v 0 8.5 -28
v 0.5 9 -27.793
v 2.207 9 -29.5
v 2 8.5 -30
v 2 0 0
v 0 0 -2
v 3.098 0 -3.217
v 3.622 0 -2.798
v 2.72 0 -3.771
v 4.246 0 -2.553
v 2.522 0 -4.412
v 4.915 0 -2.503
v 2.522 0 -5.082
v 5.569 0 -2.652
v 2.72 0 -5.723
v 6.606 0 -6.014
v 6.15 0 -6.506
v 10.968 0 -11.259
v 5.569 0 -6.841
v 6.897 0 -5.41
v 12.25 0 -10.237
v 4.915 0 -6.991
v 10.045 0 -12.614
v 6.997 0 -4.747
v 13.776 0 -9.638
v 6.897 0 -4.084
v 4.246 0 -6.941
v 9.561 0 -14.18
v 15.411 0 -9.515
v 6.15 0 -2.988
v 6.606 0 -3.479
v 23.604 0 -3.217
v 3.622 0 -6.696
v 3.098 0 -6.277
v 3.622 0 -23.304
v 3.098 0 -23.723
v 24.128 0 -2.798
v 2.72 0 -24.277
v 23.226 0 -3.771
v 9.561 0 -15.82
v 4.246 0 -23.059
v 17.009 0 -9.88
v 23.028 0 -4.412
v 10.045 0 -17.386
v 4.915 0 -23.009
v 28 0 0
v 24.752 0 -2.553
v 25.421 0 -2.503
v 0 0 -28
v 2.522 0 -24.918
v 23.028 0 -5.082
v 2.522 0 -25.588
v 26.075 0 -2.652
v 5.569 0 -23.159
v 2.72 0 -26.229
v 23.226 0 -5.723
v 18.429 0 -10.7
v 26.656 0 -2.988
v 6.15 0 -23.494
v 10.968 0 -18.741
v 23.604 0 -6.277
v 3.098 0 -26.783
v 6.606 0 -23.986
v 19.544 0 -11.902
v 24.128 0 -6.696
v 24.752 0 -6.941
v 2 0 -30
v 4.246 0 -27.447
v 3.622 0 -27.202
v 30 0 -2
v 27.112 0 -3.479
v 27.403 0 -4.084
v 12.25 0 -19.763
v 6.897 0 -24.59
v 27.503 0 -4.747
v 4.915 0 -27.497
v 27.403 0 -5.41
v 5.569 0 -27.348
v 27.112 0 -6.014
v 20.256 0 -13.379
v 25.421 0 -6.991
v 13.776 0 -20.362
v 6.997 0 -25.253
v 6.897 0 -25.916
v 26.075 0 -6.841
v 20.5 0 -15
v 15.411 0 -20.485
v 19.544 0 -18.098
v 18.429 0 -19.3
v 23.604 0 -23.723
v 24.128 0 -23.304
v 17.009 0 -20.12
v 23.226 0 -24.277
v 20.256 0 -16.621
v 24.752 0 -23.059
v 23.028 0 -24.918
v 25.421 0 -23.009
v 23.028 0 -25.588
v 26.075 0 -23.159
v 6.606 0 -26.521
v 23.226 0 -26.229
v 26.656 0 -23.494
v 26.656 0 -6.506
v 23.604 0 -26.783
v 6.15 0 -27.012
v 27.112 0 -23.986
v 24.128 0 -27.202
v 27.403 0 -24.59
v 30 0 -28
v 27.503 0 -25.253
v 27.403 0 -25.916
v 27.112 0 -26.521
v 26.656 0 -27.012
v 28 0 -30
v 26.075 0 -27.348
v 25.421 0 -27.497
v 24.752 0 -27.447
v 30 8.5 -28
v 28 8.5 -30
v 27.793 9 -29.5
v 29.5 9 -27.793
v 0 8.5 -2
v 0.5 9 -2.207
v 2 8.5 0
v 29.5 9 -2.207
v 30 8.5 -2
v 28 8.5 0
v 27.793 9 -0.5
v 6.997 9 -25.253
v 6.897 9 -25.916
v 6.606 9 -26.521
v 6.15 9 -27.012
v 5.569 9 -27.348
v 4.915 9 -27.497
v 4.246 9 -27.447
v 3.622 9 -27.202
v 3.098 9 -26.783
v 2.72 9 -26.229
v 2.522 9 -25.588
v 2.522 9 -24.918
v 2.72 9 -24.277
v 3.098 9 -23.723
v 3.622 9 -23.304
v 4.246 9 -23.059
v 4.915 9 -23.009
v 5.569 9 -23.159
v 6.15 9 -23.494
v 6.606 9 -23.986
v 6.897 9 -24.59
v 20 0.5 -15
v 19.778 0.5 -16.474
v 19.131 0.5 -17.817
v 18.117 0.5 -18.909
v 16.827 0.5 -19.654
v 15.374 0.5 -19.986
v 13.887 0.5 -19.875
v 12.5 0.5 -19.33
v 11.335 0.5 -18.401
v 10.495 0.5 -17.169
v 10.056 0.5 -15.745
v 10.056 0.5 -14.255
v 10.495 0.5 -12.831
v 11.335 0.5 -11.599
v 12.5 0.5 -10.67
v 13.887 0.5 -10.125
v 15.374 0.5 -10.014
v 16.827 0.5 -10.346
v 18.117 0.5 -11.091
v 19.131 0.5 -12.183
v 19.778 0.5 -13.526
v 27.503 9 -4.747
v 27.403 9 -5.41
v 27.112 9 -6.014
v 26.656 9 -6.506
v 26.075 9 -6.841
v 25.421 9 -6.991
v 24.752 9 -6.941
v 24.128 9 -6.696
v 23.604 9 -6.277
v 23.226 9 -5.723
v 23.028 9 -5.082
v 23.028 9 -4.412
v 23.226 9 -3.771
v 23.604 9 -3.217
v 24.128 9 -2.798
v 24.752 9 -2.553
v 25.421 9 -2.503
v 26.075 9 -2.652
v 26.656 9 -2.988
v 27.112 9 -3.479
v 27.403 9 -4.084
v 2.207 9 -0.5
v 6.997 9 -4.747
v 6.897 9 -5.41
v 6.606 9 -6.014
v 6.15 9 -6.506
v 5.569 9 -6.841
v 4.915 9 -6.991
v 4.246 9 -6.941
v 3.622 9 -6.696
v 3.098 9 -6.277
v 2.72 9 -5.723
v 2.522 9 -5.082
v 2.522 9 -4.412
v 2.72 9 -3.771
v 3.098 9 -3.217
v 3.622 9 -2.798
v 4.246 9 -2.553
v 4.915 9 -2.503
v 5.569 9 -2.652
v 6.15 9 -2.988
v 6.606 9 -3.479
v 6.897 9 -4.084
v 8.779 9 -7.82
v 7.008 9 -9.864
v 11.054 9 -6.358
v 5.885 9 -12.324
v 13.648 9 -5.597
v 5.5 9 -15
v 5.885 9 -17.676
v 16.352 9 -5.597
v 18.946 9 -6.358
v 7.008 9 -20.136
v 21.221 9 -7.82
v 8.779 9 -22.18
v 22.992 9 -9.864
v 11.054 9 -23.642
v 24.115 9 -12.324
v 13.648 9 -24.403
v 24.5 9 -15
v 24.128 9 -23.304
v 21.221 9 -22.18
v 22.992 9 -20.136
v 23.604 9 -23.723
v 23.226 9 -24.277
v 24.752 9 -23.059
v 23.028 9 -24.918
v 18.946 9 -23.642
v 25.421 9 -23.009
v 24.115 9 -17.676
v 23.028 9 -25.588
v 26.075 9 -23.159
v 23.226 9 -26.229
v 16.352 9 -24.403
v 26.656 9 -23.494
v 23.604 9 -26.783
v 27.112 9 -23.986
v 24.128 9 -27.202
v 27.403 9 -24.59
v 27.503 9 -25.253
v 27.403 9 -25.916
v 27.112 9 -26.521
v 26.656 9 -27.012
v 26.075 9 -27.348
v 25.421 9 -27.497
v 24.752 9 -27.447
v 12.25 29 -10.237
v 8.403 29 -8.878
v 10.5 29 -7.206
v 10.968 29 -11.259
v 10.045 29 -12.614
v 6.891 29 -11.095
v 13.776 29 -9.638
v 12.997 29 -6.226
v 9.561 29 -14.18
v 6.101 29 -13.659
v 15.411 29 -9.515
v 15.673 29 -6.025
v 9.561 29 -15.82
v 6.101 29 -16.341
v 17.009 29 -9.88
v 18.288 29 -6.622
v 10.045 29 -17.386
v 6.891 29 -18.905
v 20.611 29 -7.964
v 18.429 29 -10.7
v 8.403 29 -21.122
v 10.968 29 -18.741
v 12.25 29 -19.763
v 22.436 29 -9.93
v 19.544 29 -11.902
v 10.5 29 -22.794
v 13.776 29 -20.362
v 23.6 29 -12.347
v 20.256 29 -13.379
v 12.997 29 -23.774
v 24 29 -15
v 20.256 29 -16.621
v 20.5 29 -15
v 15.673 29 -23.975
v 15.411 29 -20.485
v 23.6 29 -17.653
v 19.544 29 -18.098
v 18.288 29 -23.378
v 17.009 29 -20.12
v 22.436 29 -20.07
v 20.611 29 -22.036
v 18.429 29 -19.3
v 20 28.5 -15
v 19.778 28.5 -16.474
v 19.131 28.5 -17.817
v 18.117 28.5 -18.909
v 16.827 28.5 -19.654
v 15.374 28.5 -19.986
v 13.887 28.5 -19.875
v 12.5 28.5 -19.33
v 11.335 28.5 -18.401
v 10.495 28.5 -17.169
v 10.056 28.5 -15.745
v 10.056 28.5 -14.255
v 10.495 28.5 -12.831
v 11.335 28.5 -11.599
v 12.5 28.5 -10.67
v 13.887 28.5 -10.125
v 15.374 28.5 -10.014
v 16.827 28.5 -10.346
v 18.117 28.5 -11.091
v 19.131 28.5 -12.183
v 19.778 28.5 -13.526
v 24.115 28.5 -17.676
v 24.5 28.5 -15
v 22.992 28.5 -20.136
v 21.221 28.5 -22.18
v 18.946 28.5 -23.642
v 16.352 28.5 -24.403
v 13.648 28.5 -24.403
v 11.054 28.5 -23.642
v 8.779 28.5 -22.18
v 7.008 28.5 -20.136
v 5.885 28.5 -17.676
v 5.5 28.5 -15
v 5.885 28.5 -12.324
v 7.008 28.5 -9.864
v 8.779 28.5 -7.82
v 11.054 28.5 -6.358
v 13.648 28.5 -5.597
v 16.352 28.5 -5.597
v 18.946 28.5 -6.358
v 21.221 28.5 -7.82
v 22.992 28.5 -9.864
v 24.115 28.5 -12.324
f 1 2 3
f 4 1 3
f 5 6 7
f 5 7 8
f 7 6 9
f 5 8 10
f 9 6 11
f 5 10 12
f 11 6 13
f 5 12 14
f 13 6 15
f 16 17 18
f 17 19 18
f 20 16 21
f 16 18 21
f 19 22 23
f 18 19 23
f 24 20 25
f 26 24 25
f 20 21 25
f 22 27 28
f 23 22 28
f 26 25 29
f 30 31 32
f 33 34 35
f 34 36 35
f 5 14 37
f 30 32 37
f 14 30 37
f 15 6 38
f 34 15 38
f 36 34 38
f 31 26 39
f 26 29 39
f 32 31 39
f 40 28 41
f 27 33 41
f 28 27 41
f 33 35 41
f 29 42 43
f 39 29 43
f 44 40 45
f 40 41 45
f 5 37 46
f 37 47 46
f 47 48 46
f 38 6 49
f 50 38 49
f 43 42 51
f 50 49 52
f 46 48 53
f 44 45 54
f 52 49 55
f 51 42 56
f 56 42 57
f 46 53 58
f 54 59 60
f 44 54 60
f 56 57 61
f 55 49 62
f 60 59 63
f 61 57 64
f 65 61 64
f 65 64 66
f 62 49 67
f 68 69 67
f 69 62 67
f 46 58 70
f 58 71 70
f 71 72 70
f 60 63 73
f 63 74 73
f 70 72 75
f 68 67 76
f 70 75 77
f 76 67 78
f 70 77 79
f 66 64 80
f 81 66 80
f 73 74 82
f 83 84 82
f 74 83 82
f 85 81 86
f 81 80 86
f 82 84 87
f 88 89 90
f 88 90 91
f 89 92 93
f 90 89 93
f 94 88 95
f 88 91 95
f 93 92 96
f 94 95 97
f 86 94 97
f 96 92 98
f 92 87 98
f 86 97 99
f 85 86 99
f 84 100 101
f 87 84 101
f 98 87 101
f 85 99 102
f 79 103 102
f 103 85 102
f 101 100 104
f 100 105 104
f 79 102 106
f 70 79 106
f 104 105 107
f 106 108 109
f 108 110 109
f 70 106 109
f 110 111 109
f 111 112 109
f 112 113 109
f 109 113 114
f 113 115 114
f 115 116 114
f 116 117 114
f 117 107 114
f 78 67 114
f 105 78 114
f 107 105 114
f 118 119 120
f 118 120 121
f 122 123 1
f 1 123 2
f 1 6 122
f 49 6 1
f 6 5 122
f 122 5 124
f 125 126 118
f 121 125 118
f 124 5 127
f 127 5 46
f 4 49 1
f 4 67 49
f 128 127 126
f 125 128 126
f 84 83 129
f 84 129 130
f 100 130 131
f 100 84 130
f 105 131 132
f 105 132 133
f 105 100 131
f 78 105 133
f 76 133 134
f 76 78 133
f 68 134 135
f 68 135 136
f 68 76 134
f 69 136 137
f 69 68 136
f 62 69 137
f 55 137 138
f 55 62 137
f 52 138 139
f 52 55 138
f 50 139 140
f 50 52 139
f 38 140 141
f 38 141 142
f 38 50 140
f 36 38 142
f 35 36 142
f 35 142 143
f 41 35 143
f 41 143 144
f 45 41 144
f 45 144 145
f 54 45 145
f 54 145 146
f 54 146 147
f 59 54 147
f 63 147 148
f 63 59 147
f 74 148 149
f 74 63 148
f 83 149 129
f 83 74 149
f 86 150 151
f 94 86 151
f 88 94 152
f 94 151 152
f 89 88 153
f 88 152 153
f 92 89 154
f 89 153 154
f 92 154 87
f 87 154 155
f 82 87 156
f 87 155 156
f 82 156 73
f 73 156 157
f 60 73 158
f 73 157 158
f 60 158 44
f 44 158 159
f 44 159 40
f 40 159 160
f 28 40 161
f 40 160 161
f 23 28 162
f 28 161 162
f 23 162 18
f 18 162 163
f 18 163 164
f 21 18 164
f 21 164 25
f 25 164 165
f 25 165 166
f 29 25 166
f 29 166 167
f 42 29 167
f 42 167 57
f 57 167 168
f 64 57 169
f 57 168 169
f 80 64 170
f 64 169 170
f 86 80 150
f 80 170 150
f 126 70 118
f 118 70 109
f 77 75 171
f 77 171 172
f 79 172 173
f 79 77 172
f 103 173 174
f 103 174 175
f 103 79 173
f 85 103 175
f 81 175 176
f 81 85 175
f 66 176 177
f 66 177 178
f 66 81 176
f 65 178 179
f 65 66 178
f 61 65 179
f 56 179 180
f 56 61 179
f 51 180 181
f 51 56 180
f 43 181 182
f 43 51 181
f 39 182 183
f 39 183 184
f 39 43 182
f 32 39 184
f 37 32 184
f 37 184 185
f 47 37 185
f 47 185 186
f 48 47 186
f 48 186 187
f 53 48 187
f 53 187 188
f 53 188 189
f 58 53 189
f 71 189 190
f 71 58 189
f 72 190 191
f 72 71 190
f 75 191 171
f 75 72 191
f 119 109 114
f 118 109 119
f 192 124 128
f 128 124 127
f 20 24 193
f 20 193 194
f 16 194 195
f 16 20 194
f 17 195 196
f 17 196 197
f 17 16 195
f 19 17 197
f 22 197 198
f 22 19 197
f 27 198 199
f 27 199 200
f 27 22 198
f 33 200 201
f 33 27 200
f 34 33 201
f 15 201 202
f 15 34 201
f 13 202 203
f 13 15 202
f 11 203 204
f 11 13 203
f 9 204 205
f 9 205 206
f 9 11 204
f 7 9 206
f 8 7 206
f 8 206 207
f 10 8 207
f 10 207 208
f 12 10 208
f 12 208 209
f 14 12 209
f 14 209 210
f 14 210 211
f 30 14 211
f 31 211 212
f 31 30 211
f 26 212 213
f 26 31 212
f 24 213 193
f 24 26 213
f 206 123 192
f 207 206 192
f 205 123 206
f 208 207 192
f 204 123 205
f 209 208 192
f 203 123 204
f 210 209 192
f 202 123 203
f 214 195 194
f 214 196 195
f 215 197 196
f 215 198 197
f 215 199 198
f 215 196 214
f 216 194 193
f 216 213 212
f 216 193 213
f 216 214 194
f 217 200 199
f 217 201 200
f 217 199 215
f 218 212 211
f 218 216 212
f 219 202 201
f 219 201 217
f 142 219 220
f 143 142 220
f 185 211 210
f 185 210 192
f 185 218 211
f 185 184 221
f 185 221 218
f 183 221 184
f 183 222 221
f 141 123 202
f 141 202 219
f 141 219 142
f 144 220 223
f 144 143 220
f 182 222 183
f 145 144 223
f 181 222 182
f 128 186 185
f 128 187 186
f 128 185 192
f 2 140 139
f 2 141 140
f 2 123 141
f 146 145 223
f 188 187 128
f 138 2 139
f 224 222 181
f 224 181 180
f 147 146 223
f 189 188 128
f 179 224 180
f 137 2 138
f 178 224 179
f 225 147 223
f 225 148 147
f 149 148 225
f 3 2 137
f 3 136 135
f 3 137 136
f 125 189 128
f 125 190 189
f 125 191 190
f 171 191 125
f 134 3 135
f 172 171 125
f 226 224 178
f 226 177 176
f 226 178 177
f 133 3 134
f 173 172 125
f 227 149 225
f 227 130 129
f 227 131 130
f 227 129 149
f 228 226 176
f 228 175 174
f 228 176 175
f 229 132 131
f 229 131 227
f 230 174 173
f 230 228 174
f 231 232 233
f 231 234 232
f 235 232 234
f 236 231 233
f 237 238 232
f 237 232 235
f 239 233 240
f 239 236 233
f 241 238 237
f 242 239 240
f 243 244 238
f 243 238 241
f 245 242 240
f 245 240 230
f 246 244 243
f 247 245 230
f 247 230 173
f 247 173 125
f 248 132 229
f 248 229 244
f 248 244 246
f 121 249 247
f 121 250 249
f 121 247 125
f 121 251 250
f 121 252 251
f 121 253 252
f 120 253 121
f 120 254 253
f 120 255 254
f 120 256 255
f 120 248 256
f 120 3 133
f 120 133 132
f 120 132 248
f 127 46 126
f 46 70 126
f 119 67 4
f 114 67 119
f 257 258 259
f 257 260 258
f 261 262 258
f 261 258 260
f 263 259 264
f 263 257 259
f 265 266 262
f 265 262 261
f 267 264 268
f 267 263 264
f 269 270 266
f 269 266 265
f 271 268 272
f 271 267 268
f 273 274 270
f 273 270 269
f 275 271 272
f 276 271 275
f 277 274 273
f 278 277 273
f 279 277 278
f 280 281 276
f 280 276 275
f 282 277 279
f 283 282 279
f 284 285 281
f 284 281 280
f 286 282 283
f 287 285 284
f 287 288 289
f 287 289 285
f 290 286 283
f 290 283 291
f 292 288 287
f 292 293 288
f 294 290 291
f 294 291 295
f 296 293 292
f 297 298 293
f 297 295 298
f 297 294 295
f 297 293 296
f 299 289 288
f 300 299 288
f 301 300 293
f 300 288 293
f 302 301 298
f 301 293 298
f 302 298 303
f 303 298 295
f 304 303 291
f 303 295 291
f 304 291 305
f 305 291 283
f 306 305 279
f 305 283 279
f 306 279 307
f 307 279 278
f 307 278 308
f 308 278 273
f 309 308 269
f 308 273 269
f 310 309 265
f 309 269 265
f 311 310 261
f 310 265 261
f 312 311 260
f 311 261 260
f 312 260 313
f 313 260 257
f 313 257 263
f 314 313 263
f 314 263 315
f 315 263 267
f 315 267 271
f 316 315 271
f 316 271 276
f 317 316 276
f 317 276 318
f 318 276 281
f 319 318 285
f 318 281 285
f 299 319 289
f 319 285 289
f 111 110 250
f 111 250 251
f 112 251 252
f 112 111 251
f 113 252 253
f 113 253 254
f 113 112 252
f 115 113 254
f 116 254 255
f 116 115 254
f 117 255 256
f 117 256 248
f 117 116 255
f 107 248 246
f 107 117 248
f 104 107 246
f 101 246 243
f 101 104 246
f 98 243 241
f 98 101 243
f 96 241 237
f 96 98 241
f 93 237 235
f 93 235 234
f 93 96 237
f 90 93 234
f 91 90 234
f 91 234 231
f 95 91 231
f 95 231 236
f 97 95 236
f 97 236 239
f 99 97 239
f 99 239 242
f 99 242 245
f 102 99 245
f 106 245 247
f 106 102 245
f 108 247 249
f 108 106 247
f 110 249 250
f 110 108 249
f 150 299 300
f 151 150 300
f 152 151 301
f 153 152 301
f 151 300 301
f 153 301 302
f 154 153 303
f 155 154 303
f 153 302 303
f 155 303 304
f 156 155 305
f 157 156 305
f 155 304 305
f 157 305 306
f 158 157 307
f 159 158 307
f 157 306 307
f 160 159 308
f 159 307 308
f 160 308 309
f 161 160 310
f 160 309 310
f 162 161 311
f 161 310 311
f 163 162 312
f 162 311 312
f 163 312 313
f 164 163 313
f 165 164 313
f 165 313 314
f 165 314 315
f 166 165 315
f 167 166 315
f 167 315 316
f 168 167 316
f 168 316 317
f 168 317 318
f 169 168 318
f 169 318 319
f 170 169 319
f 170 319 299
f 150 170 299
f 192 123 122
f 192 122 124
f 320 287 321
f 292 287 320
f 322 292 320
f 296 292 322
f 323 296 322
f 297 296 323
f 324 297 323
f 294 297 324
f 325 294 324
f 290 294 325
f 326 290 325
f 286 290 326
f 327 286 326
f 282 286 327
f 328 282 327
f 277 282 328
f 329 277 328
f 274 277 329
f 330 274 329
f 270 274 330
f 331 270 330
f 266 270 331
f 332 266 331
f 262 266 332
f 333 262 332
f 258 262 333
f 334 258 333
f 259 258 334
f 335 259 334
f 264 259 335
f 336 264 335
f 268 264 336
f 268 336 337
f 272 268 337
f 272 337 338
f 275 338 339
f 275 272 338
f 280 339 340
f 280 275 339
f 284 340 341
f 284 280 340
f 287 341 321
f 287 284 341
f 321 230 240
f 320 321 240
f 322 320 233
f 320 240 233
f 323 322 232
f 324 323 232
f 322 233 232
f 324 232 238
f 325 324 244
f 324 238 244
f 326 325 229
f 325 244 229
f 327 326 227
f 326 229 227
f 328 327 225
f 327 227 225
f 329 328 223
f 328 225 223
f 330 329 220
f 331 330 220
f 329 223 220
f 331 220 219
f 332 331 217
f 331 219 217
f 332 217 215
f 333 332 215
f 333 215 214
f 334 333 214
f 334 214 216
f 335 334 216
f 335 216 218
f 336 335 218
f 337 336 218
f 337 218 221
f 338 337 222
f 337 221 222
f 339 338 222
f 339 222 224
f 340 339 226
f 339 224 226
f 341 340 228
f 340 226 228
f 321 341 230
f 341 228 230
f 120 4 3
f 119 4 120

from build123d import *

# Parameters (mm, degrees)
ESQUISSE1_W      = 30
ESQUISSE1_H      = 30
ESQUISSE1_R      = 2.25
EXTRUSION1_DEPTH = 9
ESQUISSE2_R      = 9.5
EXTRUSION2_DEPTH = 20
CHANFREIN1_SIZE  = 2
EXTRUSION3_REACH = 31
ESQUISSE3_R      = 5
CHANFREIN2_SIZE  = 0.5


with BuildPart() as part:
    # Esquisse1 → Extrusion1 (new body)
    with BuildSketch(Plane(origin=(0, 0, 0), x_dir=(1, 0, 0), z_dir=(0, 1, 0))):
        with Locations((15, 15)):
            Rectangle(ESQUISSE1_W, ESQUISSE1_H)
        with Locations((4.746951673, 25.253048327)):
            Circle(ESQUISSE1_R, mode=Mode.SUBTRACT)
        with Locations((25.253048327, 25.253048327)):
            Circle(ESQUISSE1_R, mode=Mode.SUBTRACT)
        with Locations((25.253048327, 4.746951673)):
            Circle(ESQUISSE1_R, mode=Mode.SUBTRACT)
        with Locations((4.746951673, 4.746951673)):
            Circle(ESQUISSE1_R, mode=Mode.SUBTRACT)
    extrude(amount=EXTRUSION1_DEPTH)

    # Esquisse2 → Extrusion2 (add)
    with BuildSketch(Plane(origin=(0, 9, 0), x_dir=(1, 0, 0), z_dir=(0, 1, 0))):
        with Locations((15, 15)):
            Circle(ESQUISSE2_R)
    extrude(amount=EXTRUSION2_DEPTH)

    # Chanfrein1
    chanfrein1_edges = [part.edges().sort_by_distance(p)[0] for p in [
        (0, 4.5, -30),
        (30, 4.5, -30),
        (30, 4.5, 0),
        (0, 4.5, 0),
    ]]
    chamfer(chanfrein1_edges, length=CHANFREIN1_SIZE)

    # Esquisse3 → Extrusion3 (cut, up to next)
    with BuildSketch(Plane(origin=(0, 29, 0), x_dir=(1, 0, 0), z_dir=(0, 1, 0)), mode=Mode.PRIVATE) as extrusion3_sk1:
        with Locations((15, 15)):
            Circle(ESQUISSE3_R)
    extrusion3_tool1 = extrude(extrusion3_sk1.sketch, amount=-EXTRUSION3_REACH, mode=Mode.PRIVATE) & part.part
    add(extrusion3_tool1.solids().sort_by_distance((15, 29, -15))[0], mode=Mode.SUBTRACT)

    # Chanfrein2
    chanfrein2_edges = [part.edges().sort_by_distance(p)[0] for p in [
        (5.5, 29, -15),
        (0, 9, -15),
        (15, 9, -30),
        (15, 9, 0),
        (30, 9, -15),
        (1, 9, -1),
        (29, 9, -1),
        (29, 9, -29),
        (1, 9, -29),
        (10, 0, -15),
        (10, 29, -15),
    ]]
    chamfer(chanfrein2_edges, length=CHANFREIN2_SIZE)


solid = part.part
